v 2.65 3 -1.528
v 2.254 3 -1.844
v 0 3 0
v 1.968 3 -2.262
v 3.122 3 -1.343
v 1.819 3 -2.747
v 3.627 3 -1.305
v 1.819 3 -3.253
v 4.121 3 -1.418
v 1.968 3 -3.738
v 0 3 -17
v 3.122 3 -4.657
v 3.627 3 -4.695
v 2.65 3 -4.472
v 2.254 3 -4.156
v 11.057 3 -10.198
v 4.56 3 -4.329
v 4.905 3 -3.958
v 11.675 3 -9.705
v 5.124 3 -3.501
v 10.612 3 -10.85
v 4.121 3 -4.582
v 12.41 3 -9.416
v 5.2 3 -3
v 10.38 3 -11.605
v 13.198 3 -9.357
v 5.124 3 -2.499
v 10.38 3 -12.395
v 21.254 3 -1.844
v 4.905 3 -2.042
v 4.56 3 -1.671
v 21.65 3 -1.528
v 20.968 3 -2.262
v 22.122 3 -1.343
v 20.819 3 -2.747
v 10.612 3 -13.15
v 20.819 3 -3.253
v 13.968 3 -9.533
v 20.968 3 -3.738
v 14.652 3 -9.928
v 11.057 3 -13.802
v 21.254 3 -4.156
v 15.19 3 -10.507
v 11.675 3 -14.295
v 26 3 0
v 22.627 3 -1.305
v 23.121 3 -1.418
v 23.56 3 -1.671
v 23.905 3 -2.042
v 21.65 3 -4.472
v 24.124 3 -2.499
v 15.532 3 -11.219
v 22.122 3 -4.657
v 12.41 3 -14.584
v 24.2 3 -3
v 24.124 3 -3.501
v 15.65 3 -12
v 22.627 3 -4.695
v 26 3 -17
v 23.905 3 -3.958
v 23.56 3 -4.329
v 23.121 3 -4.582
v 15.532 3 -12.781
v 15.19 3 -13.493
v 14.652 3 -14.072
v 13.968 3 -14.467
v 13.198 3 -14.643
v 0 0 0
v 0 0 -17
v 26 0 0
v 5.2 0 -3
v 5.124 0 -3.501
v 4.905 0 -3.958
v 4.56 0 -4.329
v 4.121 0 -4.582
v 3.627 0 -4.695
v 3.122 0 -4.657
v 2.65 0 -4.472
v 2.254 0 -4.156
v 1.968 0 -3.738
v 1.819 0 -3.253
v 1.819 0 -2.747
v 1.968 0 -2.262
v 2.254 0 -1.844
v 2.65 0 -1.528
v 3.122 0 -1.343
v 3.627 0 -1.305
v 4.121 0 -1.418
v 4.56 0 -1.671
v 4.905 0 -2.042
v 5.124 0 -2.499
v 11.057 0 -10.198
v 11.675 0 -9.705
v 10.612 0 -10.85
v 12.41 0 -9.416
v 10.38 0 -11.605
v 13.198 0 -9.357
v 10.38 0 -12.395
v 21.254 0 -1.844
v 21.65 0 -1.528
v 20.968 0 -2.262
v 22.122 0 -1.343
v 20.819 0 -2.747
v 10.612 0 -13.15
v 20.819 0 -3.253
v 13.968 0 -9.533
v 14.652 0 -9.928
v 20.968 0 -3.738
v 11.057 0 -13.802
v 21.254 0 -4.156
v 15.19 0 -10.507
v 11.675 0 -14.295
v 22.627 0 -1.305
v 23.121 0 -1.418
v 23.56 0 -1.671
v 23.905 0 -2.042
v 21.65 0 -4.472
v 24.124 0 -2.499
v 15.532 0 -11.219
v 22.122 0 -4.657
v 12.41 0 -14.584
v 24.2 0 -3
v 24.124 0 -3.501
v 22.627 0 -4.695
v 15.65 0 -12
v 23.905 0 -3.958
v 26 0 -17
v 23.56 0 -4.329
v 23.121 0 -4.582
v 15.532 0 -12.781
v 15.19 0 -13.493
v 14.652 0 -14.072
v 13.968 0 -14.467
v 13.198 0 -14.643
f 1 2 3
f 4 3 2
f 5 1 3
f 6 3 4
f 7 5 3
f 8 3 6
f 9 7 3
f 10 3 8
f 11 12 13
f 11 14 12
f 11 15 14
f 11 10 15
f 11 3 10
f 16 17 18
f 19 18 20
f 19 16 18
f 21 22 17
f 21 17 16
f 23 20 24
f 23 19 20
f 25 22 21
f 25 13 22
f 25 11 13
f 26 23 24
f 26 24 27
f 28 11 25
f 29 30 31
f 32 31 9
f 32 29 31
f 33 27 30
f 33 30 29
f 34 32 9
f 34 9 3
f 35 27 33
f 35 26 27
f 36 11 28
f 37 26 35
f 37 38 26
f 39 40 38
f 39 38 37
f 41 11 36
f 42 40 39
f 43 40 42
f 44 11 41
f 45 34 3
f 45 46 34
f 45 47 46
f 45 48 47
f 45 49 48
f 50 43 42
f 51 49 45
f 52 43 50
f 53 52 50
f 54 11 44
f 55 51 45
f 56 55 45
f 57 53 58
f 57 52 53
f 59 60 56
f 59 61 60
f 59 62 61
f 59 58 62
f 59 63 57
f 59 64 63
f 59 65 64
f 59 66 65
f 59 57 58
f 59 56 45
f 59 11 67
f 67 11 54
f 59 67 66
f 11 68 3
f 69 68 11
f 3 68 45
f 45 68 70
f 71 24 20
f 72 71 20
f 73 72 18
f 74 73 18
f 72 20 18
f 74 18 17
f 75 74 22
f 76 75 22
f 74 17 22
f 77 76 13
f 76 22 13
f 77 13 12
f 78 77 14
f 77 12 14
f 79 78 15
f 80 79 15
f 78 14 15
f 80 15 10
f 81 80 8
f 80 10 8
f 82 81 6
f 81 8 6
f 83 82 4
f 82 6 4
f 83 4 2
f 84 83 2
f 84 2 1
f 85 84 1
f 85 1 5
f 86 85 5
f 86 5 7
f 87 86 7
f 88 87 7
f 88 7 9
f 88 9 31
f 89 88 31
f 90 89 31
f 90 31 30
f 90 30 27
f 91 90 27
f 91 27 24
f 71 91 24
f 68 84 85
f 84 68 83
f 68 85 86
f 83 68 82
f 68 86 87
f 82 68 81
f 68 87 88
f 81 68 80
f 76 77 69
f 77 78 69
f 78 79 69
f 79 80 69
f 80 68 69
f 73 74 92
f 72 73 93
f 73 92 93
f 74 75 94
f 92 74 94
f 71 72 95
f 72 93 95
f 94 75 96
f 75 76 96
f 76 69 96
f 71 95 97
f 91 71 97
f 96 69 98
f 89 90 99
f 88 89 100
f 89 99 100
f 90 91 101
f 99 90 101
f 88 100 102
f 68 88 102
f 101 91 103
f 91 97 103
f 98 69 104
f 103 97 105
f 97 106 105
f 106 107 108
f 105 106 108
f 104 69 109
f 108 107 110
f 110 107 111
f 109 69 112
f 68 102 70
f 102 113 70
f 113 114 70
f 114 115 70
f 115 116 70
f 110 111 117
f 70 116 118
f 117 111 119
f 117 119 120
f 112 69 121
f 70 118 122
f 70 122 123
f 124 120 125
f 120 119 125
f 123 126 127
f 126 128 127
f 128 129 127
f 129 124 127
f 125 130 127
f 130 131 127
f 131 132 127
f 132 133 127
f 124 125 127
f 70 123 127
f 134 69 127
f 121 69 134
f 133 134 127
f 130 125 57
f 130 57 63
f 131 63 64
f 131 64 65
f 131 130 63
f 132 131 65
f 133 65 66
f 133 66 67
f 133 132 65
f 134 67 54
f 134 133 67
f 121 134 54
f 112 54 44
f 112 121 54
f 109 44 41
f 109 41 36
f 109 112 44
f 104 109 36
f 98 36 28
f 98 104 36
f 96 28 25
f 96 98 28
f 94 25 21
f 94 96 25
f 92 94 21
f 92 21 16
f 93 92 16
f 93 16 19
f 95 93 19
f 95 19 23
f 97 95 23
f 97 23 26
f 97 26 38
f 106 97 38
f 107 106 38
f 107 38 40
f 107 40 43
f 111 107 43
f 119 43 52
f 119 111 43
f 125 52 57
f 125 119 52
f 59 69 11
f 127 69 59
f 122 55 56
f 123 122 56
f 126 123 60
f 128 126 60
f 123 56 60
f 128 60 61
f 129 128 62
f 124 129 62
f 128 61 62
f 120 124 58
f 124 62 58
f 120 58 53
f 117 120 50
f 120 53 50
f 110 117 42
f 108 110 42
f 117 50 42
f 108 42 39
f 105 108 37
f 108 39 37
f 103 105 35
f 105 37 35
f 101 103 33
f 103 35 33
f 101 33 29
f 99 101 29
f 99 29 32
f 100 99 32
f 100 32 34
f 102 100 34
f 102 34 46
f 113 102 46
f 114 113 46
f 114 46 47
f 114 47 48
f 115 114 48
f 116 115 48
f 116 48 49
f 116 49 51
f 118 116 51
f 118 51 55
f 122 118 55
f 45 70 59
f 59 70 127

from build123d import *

# Parameters (mm, degrees)
ESBO_O1_W                = 26
ESBO_O1_H                = 17
ESBO_O1_R                = 2.65
RESSALTO_EXTRUS_O1_DEPTH = 3
ESBO_O2_R                = 1.7
CORTE_EXTRUS_O1_DEPTH    = 10


with BuildPart() as part:
    # Esboço1 → Ressalto-extrusão1 (new body)
    with BuildSketch(Plane(origin=(0, 0, 0), x_dir=(1, 0, 0), z_dir=(0, 1, 0))):
        with Locations((13, 8.5)):
            Rectangle(ESBO_O1_W, ESBO_O1_H)
        with Locations((13, 12)):
            Circle(ESBO_O1_R, mode=Mode.SUBTRACT)
    extrude(amount=RESSALTO_EXTRUS_O1_DEPTH)

    # Esboço2 → Corte-extrusão1 (cut)
    with BuildSketch(Plane(origin=(0, 3, 0), x_dir=(1, 0, 0), z_dir=(0, 1, 0))):
        with Locations((3.5, 3)):
            Circle(ESBO_O2_R)
        with Locations((22.5, 3)):
            Circle(ESBO_O2_R)
    extrude(amount=-CORTE_EXTRUS_O1_DEPTH, mode=Mode.SUBTRACT)


solid = part.part
